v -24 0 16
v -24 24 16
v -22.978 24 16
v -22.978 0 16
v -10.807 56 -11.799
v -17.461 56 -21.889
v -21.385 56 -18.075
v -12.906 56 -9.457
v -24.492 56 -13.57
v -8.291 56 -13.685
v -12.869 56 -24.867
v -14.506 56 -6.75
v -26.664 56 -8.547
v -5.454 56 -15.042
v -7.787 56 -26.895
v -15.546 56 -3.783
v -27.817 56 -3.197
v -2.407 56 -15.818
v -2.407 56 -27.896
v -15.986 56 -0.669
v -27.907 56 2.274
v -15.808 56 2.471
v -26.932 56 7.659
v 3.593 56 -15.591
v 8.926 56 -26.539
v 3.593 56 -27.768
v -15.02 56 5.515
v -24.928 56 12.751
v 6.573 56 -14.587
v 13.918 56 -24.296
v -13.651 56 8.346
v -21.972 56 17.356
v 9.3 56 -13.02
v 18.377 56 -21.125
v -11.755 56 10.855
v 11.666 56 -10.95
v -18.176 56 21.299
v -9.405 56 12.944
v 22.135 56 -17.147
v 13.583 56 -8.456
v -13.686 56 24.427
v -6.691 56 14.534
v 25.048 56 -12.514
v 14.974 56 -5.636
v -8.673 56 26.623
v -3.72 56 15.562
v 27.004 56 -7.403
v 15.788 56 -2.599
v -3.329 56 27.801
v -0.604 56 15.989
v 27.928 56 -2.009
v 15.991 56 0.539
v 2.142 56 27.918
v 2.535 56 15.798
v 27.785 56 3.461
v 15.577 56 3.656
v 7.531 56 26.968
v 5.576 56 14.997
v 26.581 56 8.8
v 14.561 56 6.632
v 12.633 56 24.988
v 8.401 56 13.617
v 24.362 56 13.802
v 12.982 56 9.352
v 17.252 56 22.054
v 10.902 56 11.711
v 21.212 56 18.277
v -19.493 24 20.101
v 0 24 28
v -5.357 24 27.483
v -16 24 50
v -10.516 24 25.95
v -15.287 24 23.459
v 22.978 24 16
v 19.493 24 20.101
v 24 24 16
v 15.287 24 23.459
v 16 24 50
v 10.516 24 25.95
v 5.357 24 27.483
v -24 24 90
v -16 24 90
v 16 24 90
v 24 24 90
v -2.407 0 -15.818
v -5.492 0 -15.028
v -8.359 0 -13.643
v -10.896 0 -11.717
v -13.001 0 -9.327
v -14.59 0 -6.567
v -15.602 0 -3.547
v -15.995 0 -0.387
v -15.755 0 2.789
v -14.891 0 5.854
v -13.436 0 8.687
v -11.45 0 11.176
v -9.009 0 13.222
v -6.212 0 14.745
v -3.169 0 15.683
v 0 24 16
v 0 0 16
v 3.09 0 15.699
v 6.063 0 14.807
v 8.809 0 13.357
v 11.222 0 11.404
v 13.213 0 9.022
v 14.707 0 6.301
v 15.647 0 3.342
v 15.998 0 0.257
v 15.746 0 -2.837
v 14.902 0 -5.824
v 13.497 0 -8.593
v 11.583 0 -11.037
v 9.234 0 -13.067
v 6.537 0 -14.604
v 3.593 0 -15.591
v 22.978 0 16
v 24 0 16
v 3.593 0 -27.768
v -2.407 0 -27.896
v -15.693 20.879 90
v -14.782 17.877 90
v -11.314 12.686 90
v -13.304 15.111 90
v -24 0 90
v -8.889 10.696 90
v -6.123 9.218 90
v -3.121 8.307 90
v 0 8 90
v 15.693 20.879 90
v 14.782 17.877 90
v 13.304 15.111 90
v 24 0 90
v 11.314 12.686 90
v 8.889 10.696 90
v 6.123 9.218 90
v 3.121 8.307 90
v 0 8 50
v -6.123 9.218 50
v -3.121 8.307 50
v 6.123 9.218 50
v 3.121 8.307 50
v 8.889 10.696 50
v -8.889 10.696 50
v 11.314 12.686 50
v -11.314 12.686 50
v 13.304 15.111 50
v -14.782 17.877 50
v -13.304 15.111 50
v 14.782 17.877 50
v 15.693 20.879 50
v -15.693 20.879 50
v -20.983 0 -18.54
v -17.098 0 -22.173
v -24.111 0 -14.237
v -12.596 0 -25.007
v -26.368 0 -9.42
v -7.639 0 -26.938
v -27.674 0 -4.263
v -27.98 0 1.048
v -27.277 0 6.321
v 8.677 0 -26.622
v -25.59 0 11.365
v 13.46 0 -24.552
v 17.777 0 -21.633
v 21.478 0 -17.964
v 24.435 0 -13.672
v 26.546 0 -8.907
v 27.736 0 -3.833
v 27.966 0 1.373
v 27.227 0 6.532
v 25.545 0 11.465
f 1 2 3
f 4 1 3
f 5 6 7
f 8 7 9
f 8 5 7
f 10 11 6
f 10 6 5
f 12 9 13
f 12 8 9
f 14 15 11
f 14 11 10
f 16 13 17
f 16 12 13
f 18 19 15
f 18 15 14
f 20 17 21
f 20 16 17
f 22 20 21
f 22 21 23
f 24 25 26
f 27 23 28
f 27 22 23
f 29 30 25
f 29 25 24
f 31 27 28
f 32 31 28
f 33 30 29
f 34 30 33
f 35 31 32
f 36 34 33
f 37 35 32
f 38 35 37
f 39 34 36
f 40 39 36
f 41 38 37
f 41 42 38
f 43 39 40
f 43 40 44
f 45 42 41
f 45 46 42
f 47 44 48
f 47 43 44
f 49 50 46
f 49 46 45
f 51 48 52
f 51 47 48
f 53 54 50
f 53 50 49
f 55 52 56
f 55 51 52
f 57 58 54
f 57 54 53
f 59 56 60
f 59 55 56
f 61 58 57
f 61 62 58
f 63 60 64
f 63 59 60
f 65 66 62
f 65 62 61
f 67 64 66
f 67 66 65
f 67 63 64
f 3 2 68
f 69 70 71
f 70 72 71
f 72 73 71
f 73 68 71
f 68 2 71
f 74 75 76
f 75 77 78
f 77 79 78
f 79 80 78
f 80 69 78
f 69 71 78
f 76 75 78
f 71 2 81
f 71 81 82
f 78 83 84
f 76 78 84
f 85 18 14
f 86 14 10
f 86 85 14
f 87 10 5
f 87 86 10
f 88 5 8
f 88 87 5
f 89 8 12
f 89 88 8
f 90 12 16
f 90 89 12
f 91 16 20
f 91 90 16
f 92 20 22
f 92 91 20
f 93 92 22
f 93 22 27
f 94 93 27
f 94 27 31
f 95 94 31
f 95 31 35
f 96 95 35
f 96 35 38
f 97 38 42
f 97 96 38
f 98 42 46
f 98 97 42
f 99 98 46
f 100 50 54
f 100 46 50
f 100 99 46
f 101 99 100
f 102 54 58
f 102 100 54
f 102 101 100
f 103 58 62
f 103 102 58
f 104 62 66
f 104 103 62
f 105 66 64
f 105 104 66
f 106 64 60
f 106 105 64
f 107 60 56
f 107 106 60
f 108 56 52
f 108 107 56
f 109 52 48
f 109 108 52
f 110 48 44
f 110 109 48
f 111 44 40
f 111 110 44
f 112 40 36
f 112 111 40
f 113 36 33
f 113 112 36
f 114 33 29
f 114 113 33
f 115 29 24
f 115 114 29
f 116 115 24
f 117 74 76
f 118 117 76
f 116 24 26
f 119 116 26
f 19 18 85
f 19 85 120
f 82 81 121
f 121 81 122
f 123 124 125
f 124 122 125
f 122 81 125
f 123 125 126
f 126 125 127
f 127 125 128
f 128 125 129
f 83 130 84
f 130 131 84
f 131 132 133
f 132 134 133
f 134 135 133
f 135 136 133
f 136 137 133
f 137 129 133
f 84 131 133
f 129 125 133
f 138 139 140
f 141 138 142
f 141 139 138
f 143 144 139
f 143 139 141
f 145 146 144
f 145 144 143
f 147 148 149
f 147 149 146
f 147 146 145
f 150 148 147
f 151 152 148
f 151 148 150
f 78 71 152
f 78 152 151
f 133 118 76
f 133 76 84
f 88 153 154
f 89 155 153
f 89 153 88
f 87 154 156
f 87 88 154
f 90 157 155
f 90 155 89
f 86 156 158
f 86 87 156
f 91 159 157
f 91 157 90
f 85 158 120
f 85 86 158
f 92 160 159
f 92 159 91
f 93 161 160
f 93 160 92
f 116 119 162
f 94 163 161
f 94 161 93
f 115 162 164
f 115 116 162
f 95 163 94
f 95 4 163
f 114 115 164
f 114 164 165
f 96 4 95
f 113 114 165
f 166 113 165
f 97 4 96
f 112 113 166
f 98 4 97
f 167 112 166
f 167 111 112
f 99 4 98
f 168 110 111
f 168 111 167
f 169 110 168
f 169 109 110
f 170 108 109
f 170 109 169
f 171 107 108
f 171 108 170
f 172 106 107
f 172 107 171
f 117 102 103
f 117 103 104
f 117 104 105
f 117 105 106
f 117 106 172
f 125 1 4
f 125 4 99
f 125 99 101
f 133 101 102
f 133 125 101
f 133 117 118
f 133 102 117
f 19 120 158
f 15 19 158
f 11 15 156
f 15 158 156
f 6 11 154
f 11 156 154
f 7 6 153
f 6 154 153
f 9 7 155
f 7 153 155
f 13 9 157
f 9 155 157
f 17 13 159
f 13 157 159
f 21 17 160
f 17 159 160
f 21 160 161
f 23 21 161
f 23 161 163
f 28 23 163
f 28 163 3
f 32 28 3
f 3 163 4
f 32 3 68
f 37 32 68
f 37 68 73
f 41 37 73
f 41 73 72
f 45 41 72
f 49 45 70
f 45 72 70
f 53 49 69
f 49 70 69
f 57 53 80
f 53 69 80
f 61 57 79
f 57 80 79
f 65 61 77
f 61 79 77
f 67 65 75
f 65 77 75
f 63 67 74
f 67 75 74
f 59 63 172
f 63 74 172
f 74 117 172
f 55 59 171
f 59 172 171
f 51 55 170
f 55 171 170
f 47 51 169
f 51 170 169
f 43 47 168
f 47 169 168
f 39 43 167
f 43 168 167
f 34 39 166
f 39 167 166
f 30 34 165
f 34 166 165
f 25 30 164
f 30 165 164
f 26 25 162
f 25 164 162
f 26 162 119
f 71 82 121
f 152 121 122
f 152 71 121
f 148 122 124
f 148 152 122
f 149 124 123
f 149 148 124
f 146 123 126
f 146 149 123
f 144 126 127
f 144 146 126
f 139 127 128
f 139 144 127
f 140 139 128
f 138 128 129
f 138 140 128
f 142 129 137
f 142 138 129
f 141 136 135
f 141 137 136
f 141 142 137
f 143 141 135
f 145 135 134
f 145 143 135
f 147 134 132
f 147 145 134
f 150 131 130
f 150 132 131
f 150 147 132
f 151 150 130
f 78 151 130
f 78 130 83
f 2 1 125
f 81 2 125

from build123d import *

# Parameters (mm, degrees)
SKETCH1_R               = 28
SKETCH1_R_2             = 16
BOSS_EXTRUDE1_DEPTH     = 56
SKETCH2_W               = 6
SKETCH2_H               = 44.450735801
CUT_EXTRUDE1_DEPTH      = 56
SKETCH3_W               = 48
SKETCH3_H               = 74
BOSS_EXTRUDE2_DEPTH     = 24
CUT_EXTRUDE4_DEPTH      = 134.489909528
CUT_EXTRUDE4_DEPTH_BACK = 40


with BuildPart() as part:
    # Sketch1 → Boss-Extrude1 (new body)
    with BuildSketch(Plane(origin=(0, 0, 0), x_dir=(1, 0, 0), z_dir=(0, 1, 0))):
        with Locations(Location((0, 0, 0), (0, 0, 270))):
            Circle(SKETCH1_R)
        with Locations(Location((0, 0, 0), (0, 0, 270))):
            Circle(SKETCH1_R_2, mode=Mode.SUBTRACT)
    extrude(amount=BOSS_EXTRUDE1_DEPTH)

    # Sketch2 → Cut-Extrude1 (cut)
    with BuildSketch(Plane(origin=(0, 56, 0), x_dir=(1, 0, 0), z_dir=(0, 1, 0))):
        with Locations((0.593322954, 8.717135315)):
            Rectangle(SKETCH2_W, SKETCH2_H)
    extrude(amount=-CUT_EXTRUDE1_DEPTH, mode=Mode.SUBTRACT)

    # Sketch3 → Boss-Extrude2 (add)
    with BuildSketch(Plane.XZ):
        with Locations((0, 53)):
            Rectangle(SKETCH3_W, SKETCH3_H)
    extrude(amount=-BOSS_EXTRUDE2_DEPTH)

    # Sketch4 → Cut-Extrude4 (cut, two sides: drawn at the far end of the back side and taken through both)
    with BuildSketch(Plane.XY.offset(90).offset(-CUT_EXTRUDE4_DEPTH_BACK)):
        with BuildLine():
            Line((-16, 142.81176407), (-16, 24))
            ThreePointArc((-16, 24), (0, 8), (16, 24))
            Line((16, 24), (16, 142.81176407))
            Line((16, 142.81176407), (16, 380.43529221))
            Line((16, 380.43529221), (-16, 380.43529221))
            Line((-16, 380.43529221), (-16, 142.81176407))
        make_face()
    extrude(amount=CUT_EXTRUDE4_DEPTH + CUT_EXTRUDE4_DEPTH_BACK, mode=Mode.SUBTRACT)


solid = part.part
